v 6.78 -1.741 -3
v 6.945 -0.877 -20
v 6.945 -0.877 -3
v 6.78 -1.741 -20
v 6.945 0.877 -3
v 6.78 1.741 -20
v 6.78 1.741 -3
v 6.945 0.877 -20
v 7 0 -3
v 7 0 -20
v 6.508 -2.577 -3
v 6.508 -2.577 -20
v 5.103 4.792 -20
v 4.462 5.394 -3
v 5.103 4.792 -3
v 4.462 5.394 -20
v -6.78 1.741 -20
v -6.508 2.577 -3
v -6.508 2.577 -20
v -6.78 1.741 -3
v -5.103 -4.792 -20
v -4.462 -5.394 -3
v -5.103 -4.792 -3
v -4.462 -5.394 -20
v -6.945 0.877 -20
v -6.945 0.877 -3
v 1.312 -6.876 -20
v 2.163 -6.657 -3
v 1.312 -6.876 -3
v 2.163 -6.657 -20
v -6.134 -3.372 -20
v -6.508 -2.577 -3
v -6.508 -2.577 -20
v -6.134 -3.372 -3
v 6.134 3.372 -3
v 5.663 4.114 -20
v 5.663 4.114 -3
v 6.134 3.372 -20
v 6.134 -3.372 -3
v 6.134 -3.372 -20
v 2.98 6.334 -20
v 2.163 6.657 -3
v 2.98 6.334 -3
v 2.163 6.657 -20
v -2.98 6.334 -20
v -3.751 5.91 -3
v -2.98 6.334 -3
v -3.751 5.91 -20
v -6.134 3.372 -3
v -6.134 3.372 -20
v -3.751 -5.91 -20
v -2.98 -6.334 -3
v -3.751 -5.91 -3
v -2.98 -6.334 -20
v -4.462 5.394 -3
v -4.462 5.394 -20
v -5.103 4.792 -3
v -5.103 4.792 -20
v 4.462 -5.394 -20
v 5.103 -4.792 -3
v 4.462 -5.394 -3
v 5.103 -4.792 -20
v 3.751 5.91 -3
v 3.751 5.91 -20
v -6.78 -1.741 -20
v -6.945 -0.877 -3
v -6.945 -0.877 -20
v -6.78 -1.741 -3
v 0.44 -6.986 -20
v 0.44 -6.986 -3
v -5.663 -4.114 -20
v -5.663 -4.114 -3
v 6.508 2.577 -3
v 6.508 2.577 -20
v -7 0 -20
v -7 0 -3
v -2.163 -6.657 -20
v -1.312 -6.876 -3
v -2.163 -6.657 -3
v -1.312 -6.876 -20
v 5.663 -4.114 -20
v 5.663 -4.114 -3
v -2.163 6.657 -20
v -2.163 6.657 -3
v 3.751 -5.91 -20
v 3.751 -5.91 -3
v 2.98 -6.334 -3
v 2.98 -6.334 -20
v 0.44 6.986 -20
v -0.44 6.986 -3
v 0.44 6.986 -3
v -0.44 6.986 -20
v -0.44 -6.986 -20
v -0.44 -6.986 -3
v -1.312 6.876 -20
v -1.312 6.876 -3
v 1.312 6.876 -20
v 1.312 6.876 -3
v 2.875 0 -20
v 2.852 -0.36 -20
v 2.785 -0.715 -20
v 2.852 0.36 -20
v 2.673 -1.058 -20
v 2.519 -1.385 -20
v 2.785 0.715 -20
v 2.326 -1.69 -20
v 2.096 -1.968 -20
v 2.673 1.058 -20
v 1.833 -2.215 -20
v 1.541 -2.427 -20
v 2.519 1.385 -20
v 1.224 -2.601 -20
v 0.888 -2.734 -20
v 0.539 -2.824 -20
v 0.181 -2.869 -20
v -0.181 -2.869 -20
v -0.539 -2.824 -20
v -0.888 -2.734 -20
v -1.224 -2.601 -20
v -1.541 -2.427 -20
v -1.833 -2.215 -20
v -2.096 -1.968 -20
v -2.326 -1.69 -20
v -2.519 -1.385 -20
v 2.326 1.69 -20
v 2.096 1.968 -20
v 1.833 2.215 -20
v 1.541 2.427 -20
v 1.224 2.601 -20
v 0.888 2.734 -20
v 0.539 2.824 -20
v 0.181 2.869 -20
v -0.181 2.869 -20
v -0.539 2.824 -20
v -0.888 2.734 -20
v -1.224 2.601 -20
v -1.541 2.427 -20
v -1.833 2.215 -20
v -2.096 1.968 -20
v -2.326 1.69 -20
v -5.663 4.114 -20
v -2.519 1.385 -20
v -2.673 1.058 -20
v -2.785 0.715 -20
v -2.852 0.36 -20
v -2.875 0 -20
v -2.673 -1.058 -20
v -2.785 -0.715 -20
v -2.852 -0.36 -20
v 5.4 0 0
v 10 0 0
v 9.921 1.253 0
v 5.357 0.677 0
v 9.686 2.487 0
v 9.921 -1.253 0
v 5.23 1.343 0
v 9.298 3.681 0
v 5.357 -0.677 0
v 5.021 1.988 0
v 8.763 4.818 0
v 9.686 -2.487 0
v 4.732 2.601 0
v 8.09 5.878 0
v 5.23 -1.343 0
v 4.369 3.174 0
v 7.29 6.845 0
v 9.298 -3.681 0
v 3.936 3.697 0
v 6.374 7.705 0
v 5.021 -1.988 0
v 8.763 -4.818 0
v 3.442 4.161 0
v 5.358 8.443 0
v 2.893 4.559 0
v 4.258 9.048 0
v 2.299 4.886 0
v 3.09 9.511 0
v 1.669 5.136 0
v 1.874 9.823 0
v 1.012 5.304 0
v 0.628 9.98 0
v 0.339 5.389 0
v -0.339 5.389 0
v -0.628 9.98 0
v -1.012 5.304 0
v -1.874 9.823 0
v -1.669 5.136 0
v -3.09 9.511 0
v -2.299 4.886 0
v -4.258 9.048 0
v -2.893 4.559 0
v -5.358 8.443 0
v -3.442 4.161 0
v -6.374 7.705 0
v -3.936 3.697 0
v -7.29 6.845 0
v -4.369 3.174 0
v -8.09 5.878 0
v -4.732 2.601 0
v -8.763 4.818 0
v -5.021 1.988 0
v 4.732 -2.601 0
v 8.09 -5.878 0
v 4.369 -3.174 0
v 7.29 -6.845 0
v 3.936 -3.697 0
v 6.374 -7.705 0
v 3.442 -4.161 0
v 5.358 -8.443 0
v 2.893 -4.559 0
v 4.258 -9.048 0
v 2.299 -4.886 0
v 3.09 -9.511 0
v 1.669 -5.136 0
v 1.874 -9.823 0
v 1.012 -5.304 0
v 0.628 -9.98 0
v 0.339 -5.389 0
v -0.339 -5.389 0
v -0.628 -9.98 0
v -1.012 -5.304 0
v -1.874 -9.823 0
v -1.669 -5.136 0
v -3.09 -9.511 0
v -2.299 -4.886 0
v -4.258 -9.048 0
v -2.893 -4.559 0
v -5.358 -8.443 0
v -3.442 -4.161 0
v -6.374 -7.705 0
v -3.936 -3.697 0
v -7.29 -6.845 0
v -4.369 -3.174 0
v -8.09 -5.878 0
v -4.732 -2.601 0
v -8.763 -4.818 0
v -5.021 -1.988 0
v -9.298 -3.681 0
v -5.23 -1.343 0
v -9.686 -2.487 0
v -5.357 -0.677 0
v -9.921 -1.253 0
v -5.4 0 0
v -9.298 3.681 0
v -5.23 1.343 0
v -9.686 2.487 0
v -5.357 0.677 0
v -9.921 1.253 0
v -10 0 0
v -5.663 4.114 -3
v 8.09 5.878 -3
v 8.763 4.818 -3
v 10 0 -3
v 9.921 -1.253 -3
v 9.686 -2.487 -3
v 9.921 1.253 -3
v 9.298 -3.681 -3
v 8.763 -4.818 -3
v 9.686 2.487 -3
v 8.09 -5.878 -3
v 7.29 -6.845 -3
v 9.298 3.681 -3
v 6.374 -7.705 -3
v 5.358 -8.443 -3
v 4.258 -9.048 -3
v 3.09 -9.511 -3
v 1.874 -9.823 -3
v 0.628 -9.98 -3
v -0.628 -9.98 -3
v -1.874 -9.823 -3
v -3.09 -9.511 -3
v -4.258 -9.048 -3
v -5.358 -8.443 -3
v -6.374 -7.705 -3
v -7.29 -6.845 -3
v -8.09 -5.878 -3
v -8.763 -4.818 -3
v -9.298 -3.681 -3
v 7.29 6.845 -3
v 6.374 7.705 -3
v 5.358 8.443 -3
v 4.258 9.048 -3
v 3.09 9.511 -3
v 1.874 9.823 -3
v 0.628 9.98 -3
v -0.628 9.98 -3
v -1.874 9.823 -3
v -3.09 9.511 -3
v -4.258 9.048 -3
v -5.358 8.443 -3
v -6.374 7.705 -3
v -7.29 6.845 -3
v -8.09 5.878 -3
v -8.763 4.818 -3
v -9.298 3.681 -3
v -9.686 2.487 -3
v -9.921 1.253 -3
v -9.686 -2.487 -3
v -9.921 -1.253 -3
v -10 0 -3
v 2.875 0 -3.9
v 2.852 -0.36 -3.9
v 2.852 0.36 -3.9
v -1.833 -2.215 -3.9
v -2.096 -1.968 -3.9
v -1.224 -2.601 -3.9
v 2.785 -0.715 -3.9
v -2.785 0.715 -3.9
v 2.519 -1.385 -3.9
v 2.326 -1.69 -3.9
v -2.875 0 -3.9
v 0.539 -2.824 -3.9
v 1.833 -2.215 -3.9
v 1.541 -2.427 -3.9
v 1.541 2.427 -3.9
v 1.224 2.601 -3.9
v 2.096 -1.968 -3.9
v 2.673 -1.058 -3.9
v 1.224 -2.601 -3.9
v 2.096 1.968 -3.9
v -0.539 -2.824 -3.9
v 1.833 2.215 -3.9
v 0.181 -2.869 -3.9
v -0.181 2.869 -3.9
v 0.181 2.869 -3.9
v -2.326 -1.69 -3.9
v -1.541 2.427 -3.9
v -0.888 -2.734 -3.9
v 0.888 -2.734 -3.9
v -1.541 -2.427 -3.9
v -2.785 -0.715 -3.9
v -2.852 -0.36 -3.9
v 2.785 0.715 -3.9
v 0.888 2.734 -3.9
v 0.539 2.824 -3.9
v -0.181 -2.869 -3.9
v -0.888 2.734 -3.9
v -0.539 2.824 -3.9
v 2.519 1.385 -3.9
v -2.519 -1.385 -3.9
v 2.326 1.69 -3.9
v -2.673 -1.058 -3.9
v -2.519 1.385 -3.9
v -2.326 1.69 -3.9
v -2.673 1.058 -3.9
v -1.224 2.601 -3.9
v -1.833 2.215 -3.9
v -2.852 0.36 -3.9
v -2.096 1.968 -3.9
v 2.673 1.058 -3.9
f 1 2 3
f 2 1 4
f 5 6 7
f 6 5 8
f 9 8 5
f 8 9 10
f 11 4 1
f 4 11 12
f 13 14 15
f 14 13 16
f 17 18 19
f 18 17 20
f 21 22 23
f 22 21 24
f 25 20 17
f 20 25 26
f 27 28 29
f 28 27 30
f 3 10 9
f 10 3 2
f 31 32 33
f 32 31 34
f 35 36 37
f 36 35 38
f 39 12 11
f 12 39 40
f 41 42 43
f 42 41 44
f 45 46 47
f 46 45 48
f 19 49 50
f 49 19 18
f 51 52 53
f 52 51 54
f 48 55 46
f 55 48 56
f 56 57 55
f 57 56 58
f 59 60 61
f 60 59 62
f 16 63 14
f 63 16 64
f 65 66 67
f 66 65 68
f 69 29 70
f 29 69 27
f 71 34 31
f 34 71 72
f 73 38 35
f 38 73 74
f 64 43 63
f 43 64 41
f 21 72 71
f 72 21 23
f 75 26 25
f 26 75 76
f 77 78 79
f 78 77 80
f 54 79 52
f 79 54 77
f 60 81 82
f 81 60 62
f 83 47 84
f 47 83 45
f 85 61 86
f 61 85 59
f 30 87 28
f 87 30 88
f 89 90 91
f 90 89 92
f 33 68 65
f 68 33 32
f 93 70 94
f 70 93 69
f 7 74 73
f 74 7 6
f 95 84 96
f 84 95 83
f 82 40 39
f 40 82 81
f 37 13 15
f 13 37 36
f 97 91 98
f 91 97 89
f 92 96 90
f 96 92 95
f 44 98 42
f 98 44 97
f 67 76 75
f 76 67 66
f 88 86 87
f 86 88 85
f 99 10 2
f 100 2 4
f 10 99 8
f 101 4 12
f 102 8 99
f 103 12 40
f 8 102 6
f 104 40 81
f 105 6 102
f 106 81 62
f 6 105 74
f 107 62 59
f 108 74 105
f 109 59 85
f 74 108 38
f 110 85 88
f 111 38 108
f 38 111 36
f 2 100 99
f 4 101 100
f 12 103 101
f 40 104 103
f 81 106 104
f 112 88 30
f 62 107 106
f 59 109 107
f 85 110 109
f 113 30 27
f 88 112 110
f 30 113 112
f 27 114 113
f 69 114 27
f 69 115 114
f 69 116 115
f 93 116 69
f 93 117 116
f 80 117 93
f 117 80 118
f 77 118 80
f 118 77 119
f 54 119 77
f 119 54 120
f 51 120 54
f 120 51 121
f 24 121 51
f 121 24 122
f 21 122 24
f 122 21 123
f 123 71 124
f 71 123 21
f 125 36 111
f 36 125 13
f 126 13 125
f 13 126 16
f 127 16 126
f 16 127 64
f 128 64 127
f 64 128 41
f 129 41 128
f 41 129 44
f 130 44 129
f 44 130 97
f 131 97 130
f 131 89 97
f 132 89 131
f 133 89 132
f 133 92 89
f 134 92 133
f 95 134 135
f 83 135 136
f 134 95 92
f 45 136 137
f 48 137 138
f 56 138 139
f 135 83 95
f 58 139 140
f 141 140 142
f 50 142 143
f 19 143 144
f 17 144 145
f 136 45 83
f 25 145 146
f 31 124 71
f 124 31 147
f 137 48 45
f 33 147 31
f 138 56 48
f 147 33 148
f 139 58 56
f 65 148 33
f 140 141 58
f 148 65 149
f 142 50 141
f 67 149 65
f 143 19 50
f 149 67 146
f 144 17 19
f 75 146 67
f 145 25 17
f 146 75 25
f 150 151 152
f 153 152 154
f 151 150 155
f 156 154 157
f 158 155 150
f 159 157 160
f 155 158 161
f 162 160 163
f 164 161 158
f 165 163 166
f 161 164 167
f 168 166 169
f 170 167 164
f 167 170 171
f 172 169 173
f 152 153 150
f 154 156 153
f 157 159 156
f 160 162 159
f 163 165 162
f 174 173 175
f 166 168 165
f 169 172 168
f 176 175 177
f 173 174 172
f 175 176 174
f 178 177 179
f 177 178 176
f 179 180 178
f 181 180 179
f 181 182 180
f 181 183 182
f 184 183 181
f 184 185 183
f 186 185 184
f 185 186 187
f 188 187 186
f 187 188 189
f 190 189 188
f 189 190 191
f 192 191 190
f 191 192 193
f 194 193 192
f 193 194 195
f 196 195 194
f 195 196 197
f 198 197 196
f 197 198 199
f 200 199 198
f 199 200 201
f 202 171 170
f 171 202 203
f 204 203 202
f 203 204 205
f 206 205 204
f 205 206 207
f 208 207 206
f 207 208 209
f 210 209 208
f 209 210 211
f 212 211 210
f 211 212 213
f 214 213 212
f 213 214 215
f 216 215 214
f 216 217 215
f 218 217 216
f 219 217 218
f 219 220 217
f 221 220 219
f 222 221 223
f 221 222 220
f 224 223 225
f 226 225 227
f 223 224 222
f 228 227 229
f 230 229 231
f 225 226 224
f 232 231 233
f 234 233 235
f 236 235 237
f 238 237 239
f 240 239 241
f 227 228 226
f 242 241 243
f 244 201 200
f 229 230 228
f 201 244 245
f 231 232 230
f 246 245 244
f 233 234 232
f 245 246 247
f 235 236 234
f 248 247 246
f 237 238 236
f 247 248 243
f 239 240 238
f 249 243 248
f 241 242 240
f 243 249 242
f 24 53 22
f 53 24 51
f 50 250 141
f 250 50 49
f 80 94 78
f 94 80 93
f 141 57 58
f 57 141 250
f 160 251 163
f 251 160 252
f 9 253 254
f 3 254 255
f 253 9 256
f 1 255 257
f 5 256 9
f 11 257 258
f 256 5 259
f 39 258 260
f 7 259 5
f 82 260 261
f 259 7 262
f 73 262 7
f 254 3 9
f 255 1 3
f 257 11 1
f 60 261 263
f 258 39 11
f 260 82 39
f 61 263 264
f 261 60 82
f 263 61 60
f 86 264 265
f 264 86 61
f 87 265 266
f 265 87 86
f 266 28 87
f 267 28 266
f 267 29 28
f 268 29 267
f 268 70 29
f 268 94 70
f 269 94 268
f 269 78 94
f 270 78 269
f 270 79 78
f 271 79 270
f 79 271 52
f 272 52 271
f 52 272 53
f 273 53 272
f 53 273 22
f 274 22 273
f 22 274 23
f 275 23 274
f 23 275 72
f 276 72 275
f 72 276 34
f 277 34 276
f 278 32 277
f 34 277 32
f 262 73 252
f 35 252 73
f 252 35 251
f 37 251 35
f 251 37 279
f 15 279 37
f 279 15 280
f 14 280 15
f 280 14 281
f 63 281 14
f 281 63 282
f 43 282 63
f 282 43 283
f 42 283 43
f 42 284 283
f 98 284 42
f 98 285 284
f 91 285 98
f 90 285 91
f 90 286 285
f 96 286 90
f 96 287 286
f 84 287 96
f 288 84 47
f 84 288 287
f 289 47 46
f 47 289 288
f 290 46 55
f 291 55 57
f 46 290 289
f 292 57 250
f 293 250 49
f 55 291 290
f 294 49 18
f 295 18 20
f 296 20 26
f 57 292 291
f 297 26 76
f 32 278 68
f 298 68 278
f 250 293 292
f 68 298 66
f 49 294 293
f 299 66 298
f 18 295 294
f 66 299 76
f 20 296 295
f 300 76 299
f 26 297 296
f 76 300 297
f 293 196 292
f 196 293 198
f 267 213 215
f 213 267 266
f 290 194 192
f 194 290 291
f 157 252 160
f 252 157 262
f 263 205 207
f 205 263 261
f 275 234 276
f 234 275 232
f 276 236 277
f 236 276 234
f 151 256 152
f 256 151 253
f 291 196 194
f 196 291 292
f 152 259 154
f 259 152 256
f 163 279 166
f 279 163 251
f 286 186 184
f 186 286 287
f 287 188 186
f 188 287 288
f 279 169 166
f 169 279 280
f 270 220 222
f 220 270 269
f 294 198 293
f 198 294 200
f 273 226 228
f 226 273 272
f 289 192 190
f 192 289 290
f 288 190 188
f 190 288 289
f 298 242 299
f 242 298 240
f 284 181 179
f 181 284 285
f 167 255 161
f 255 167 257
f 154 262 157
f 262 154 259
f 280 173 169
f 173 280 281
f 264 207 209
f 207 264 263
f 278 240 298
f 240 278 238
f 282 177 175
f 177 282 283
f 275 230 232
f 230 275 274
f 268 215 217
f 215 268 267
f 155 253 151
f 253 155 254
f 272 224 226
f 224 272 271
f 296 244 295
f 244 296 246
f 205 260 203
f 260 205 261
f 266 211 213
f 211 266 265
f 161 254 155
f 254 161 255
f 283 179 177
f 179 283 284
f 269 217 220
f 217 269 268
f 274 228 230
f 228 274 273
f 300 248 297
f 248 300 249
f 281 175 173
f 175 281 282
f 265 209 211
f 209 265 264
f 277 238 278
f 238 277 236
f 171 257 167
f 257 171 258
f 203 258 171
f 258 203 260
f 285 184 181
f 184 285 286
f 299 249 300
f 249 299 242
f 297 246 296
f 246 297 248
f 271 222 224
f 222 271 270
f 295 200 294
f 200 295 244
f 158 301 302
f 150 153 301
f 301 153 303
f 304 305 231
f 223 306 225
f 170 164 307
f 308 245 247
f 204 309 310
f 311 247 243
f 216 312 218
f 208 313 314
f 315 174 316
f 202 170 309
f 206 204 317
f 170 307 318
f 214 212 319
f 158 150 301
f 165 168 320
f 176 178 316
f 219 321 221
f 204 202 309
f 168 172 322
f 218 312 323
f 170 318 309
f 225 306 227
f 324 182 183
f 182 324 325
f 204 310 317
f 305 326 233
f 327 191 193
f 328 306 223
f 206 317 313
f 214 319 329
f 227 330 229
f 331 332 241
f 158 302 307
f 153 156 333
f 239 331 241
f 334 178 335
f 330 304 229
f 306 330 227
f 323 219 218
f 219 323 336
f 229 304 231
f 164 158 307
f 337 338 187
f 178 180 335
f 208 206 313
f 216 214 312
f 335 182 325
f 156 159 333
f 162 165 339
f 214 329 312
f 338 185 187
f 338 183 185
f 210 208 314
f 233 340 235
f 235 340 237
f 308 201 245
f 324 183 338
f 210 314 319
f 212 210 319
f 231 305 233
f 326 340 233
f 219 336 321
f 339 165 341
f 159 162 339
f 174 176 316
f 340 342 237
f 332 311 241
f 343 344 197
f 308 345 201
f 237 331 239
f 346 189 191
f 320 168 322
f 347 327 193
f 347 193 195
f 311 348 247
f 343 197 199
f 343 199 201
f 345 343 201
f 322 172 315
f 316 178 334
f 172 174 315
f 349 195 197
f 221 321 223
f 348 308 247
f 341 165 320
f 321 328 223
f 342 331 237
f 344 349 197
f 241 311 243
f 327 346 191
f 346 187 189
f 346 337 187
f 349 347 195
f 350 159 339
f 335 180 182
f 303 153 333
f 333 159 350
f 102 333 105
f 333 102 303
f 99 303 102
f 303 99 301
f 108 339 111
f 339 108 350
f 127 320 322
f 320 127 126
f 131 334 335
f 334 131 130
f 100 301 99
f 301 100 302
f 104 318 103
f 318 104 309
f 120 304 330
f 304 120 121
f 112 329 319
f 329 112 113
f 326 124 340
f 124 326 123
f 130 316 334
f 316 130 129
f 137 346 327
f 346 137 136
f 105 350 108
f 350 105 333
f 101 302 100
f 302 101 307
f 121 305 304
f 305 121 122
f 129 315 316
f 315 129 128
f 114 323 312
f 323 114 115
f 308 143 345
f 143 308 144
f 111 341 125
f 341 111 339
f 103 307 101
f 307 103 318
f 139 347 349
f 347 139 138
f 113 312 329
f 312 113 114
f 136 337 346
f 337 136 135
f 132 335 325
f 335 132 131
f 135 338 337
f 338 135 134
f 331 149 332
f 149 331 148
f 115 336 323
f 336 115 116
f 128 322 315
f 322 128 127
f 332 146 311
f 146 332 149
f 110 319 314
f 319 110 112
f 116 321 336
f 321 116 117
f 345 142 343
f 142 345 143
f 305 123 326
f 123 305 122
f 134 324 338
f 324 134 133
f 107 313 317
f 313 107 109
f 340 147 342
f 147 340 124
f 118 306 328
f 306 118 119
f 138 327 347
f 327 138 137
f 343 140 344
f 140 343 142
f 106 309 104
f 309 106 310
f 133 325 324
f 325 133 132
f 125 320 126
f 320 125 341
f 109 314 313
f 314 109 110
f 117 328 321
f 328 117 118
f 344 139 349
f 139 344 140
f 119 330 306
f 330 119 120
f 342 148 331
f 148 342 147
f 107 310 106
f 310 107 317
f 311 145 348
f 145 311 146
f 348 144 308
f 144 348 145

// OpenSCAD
$fn = 50;


difference() {
	union() {
		translate(v = [0, 0, -20.0000000000]) {
			cylinder(h = 20, r = 7.0000000000);
		}
		translate(v = [0, 0, -3.0000000000]) {
			cylinder(h = 3, r = 10.0000000000);
		}
	}
	union() {
		translate(v = [0, 0, 0]) {
			rotate(a = [0, 0, 0]) {
				difference() {
					union() {
						#translate(v = [0, 0, -20.0000000000]) {
							cylinder(h = 20, r = 2.6000000000);
						}
						#translate(v = [0, 0, -3.9000000000]) {
							cylinder(h = 3.9000000000, r1 = 2.8750000000, r2 = 5.4000000000);
						}
						#translate(v = [0, 0, -20.0000000000]) {
							cylinder(h = 20, r = 2.8750000000);
						}
						#translate(v = [0, 0, -20.0000000000]) {
							cylinder(h = 20, r = 2.6000000000);
						}
					}
					union();
				}
			}
		}
	}
}
